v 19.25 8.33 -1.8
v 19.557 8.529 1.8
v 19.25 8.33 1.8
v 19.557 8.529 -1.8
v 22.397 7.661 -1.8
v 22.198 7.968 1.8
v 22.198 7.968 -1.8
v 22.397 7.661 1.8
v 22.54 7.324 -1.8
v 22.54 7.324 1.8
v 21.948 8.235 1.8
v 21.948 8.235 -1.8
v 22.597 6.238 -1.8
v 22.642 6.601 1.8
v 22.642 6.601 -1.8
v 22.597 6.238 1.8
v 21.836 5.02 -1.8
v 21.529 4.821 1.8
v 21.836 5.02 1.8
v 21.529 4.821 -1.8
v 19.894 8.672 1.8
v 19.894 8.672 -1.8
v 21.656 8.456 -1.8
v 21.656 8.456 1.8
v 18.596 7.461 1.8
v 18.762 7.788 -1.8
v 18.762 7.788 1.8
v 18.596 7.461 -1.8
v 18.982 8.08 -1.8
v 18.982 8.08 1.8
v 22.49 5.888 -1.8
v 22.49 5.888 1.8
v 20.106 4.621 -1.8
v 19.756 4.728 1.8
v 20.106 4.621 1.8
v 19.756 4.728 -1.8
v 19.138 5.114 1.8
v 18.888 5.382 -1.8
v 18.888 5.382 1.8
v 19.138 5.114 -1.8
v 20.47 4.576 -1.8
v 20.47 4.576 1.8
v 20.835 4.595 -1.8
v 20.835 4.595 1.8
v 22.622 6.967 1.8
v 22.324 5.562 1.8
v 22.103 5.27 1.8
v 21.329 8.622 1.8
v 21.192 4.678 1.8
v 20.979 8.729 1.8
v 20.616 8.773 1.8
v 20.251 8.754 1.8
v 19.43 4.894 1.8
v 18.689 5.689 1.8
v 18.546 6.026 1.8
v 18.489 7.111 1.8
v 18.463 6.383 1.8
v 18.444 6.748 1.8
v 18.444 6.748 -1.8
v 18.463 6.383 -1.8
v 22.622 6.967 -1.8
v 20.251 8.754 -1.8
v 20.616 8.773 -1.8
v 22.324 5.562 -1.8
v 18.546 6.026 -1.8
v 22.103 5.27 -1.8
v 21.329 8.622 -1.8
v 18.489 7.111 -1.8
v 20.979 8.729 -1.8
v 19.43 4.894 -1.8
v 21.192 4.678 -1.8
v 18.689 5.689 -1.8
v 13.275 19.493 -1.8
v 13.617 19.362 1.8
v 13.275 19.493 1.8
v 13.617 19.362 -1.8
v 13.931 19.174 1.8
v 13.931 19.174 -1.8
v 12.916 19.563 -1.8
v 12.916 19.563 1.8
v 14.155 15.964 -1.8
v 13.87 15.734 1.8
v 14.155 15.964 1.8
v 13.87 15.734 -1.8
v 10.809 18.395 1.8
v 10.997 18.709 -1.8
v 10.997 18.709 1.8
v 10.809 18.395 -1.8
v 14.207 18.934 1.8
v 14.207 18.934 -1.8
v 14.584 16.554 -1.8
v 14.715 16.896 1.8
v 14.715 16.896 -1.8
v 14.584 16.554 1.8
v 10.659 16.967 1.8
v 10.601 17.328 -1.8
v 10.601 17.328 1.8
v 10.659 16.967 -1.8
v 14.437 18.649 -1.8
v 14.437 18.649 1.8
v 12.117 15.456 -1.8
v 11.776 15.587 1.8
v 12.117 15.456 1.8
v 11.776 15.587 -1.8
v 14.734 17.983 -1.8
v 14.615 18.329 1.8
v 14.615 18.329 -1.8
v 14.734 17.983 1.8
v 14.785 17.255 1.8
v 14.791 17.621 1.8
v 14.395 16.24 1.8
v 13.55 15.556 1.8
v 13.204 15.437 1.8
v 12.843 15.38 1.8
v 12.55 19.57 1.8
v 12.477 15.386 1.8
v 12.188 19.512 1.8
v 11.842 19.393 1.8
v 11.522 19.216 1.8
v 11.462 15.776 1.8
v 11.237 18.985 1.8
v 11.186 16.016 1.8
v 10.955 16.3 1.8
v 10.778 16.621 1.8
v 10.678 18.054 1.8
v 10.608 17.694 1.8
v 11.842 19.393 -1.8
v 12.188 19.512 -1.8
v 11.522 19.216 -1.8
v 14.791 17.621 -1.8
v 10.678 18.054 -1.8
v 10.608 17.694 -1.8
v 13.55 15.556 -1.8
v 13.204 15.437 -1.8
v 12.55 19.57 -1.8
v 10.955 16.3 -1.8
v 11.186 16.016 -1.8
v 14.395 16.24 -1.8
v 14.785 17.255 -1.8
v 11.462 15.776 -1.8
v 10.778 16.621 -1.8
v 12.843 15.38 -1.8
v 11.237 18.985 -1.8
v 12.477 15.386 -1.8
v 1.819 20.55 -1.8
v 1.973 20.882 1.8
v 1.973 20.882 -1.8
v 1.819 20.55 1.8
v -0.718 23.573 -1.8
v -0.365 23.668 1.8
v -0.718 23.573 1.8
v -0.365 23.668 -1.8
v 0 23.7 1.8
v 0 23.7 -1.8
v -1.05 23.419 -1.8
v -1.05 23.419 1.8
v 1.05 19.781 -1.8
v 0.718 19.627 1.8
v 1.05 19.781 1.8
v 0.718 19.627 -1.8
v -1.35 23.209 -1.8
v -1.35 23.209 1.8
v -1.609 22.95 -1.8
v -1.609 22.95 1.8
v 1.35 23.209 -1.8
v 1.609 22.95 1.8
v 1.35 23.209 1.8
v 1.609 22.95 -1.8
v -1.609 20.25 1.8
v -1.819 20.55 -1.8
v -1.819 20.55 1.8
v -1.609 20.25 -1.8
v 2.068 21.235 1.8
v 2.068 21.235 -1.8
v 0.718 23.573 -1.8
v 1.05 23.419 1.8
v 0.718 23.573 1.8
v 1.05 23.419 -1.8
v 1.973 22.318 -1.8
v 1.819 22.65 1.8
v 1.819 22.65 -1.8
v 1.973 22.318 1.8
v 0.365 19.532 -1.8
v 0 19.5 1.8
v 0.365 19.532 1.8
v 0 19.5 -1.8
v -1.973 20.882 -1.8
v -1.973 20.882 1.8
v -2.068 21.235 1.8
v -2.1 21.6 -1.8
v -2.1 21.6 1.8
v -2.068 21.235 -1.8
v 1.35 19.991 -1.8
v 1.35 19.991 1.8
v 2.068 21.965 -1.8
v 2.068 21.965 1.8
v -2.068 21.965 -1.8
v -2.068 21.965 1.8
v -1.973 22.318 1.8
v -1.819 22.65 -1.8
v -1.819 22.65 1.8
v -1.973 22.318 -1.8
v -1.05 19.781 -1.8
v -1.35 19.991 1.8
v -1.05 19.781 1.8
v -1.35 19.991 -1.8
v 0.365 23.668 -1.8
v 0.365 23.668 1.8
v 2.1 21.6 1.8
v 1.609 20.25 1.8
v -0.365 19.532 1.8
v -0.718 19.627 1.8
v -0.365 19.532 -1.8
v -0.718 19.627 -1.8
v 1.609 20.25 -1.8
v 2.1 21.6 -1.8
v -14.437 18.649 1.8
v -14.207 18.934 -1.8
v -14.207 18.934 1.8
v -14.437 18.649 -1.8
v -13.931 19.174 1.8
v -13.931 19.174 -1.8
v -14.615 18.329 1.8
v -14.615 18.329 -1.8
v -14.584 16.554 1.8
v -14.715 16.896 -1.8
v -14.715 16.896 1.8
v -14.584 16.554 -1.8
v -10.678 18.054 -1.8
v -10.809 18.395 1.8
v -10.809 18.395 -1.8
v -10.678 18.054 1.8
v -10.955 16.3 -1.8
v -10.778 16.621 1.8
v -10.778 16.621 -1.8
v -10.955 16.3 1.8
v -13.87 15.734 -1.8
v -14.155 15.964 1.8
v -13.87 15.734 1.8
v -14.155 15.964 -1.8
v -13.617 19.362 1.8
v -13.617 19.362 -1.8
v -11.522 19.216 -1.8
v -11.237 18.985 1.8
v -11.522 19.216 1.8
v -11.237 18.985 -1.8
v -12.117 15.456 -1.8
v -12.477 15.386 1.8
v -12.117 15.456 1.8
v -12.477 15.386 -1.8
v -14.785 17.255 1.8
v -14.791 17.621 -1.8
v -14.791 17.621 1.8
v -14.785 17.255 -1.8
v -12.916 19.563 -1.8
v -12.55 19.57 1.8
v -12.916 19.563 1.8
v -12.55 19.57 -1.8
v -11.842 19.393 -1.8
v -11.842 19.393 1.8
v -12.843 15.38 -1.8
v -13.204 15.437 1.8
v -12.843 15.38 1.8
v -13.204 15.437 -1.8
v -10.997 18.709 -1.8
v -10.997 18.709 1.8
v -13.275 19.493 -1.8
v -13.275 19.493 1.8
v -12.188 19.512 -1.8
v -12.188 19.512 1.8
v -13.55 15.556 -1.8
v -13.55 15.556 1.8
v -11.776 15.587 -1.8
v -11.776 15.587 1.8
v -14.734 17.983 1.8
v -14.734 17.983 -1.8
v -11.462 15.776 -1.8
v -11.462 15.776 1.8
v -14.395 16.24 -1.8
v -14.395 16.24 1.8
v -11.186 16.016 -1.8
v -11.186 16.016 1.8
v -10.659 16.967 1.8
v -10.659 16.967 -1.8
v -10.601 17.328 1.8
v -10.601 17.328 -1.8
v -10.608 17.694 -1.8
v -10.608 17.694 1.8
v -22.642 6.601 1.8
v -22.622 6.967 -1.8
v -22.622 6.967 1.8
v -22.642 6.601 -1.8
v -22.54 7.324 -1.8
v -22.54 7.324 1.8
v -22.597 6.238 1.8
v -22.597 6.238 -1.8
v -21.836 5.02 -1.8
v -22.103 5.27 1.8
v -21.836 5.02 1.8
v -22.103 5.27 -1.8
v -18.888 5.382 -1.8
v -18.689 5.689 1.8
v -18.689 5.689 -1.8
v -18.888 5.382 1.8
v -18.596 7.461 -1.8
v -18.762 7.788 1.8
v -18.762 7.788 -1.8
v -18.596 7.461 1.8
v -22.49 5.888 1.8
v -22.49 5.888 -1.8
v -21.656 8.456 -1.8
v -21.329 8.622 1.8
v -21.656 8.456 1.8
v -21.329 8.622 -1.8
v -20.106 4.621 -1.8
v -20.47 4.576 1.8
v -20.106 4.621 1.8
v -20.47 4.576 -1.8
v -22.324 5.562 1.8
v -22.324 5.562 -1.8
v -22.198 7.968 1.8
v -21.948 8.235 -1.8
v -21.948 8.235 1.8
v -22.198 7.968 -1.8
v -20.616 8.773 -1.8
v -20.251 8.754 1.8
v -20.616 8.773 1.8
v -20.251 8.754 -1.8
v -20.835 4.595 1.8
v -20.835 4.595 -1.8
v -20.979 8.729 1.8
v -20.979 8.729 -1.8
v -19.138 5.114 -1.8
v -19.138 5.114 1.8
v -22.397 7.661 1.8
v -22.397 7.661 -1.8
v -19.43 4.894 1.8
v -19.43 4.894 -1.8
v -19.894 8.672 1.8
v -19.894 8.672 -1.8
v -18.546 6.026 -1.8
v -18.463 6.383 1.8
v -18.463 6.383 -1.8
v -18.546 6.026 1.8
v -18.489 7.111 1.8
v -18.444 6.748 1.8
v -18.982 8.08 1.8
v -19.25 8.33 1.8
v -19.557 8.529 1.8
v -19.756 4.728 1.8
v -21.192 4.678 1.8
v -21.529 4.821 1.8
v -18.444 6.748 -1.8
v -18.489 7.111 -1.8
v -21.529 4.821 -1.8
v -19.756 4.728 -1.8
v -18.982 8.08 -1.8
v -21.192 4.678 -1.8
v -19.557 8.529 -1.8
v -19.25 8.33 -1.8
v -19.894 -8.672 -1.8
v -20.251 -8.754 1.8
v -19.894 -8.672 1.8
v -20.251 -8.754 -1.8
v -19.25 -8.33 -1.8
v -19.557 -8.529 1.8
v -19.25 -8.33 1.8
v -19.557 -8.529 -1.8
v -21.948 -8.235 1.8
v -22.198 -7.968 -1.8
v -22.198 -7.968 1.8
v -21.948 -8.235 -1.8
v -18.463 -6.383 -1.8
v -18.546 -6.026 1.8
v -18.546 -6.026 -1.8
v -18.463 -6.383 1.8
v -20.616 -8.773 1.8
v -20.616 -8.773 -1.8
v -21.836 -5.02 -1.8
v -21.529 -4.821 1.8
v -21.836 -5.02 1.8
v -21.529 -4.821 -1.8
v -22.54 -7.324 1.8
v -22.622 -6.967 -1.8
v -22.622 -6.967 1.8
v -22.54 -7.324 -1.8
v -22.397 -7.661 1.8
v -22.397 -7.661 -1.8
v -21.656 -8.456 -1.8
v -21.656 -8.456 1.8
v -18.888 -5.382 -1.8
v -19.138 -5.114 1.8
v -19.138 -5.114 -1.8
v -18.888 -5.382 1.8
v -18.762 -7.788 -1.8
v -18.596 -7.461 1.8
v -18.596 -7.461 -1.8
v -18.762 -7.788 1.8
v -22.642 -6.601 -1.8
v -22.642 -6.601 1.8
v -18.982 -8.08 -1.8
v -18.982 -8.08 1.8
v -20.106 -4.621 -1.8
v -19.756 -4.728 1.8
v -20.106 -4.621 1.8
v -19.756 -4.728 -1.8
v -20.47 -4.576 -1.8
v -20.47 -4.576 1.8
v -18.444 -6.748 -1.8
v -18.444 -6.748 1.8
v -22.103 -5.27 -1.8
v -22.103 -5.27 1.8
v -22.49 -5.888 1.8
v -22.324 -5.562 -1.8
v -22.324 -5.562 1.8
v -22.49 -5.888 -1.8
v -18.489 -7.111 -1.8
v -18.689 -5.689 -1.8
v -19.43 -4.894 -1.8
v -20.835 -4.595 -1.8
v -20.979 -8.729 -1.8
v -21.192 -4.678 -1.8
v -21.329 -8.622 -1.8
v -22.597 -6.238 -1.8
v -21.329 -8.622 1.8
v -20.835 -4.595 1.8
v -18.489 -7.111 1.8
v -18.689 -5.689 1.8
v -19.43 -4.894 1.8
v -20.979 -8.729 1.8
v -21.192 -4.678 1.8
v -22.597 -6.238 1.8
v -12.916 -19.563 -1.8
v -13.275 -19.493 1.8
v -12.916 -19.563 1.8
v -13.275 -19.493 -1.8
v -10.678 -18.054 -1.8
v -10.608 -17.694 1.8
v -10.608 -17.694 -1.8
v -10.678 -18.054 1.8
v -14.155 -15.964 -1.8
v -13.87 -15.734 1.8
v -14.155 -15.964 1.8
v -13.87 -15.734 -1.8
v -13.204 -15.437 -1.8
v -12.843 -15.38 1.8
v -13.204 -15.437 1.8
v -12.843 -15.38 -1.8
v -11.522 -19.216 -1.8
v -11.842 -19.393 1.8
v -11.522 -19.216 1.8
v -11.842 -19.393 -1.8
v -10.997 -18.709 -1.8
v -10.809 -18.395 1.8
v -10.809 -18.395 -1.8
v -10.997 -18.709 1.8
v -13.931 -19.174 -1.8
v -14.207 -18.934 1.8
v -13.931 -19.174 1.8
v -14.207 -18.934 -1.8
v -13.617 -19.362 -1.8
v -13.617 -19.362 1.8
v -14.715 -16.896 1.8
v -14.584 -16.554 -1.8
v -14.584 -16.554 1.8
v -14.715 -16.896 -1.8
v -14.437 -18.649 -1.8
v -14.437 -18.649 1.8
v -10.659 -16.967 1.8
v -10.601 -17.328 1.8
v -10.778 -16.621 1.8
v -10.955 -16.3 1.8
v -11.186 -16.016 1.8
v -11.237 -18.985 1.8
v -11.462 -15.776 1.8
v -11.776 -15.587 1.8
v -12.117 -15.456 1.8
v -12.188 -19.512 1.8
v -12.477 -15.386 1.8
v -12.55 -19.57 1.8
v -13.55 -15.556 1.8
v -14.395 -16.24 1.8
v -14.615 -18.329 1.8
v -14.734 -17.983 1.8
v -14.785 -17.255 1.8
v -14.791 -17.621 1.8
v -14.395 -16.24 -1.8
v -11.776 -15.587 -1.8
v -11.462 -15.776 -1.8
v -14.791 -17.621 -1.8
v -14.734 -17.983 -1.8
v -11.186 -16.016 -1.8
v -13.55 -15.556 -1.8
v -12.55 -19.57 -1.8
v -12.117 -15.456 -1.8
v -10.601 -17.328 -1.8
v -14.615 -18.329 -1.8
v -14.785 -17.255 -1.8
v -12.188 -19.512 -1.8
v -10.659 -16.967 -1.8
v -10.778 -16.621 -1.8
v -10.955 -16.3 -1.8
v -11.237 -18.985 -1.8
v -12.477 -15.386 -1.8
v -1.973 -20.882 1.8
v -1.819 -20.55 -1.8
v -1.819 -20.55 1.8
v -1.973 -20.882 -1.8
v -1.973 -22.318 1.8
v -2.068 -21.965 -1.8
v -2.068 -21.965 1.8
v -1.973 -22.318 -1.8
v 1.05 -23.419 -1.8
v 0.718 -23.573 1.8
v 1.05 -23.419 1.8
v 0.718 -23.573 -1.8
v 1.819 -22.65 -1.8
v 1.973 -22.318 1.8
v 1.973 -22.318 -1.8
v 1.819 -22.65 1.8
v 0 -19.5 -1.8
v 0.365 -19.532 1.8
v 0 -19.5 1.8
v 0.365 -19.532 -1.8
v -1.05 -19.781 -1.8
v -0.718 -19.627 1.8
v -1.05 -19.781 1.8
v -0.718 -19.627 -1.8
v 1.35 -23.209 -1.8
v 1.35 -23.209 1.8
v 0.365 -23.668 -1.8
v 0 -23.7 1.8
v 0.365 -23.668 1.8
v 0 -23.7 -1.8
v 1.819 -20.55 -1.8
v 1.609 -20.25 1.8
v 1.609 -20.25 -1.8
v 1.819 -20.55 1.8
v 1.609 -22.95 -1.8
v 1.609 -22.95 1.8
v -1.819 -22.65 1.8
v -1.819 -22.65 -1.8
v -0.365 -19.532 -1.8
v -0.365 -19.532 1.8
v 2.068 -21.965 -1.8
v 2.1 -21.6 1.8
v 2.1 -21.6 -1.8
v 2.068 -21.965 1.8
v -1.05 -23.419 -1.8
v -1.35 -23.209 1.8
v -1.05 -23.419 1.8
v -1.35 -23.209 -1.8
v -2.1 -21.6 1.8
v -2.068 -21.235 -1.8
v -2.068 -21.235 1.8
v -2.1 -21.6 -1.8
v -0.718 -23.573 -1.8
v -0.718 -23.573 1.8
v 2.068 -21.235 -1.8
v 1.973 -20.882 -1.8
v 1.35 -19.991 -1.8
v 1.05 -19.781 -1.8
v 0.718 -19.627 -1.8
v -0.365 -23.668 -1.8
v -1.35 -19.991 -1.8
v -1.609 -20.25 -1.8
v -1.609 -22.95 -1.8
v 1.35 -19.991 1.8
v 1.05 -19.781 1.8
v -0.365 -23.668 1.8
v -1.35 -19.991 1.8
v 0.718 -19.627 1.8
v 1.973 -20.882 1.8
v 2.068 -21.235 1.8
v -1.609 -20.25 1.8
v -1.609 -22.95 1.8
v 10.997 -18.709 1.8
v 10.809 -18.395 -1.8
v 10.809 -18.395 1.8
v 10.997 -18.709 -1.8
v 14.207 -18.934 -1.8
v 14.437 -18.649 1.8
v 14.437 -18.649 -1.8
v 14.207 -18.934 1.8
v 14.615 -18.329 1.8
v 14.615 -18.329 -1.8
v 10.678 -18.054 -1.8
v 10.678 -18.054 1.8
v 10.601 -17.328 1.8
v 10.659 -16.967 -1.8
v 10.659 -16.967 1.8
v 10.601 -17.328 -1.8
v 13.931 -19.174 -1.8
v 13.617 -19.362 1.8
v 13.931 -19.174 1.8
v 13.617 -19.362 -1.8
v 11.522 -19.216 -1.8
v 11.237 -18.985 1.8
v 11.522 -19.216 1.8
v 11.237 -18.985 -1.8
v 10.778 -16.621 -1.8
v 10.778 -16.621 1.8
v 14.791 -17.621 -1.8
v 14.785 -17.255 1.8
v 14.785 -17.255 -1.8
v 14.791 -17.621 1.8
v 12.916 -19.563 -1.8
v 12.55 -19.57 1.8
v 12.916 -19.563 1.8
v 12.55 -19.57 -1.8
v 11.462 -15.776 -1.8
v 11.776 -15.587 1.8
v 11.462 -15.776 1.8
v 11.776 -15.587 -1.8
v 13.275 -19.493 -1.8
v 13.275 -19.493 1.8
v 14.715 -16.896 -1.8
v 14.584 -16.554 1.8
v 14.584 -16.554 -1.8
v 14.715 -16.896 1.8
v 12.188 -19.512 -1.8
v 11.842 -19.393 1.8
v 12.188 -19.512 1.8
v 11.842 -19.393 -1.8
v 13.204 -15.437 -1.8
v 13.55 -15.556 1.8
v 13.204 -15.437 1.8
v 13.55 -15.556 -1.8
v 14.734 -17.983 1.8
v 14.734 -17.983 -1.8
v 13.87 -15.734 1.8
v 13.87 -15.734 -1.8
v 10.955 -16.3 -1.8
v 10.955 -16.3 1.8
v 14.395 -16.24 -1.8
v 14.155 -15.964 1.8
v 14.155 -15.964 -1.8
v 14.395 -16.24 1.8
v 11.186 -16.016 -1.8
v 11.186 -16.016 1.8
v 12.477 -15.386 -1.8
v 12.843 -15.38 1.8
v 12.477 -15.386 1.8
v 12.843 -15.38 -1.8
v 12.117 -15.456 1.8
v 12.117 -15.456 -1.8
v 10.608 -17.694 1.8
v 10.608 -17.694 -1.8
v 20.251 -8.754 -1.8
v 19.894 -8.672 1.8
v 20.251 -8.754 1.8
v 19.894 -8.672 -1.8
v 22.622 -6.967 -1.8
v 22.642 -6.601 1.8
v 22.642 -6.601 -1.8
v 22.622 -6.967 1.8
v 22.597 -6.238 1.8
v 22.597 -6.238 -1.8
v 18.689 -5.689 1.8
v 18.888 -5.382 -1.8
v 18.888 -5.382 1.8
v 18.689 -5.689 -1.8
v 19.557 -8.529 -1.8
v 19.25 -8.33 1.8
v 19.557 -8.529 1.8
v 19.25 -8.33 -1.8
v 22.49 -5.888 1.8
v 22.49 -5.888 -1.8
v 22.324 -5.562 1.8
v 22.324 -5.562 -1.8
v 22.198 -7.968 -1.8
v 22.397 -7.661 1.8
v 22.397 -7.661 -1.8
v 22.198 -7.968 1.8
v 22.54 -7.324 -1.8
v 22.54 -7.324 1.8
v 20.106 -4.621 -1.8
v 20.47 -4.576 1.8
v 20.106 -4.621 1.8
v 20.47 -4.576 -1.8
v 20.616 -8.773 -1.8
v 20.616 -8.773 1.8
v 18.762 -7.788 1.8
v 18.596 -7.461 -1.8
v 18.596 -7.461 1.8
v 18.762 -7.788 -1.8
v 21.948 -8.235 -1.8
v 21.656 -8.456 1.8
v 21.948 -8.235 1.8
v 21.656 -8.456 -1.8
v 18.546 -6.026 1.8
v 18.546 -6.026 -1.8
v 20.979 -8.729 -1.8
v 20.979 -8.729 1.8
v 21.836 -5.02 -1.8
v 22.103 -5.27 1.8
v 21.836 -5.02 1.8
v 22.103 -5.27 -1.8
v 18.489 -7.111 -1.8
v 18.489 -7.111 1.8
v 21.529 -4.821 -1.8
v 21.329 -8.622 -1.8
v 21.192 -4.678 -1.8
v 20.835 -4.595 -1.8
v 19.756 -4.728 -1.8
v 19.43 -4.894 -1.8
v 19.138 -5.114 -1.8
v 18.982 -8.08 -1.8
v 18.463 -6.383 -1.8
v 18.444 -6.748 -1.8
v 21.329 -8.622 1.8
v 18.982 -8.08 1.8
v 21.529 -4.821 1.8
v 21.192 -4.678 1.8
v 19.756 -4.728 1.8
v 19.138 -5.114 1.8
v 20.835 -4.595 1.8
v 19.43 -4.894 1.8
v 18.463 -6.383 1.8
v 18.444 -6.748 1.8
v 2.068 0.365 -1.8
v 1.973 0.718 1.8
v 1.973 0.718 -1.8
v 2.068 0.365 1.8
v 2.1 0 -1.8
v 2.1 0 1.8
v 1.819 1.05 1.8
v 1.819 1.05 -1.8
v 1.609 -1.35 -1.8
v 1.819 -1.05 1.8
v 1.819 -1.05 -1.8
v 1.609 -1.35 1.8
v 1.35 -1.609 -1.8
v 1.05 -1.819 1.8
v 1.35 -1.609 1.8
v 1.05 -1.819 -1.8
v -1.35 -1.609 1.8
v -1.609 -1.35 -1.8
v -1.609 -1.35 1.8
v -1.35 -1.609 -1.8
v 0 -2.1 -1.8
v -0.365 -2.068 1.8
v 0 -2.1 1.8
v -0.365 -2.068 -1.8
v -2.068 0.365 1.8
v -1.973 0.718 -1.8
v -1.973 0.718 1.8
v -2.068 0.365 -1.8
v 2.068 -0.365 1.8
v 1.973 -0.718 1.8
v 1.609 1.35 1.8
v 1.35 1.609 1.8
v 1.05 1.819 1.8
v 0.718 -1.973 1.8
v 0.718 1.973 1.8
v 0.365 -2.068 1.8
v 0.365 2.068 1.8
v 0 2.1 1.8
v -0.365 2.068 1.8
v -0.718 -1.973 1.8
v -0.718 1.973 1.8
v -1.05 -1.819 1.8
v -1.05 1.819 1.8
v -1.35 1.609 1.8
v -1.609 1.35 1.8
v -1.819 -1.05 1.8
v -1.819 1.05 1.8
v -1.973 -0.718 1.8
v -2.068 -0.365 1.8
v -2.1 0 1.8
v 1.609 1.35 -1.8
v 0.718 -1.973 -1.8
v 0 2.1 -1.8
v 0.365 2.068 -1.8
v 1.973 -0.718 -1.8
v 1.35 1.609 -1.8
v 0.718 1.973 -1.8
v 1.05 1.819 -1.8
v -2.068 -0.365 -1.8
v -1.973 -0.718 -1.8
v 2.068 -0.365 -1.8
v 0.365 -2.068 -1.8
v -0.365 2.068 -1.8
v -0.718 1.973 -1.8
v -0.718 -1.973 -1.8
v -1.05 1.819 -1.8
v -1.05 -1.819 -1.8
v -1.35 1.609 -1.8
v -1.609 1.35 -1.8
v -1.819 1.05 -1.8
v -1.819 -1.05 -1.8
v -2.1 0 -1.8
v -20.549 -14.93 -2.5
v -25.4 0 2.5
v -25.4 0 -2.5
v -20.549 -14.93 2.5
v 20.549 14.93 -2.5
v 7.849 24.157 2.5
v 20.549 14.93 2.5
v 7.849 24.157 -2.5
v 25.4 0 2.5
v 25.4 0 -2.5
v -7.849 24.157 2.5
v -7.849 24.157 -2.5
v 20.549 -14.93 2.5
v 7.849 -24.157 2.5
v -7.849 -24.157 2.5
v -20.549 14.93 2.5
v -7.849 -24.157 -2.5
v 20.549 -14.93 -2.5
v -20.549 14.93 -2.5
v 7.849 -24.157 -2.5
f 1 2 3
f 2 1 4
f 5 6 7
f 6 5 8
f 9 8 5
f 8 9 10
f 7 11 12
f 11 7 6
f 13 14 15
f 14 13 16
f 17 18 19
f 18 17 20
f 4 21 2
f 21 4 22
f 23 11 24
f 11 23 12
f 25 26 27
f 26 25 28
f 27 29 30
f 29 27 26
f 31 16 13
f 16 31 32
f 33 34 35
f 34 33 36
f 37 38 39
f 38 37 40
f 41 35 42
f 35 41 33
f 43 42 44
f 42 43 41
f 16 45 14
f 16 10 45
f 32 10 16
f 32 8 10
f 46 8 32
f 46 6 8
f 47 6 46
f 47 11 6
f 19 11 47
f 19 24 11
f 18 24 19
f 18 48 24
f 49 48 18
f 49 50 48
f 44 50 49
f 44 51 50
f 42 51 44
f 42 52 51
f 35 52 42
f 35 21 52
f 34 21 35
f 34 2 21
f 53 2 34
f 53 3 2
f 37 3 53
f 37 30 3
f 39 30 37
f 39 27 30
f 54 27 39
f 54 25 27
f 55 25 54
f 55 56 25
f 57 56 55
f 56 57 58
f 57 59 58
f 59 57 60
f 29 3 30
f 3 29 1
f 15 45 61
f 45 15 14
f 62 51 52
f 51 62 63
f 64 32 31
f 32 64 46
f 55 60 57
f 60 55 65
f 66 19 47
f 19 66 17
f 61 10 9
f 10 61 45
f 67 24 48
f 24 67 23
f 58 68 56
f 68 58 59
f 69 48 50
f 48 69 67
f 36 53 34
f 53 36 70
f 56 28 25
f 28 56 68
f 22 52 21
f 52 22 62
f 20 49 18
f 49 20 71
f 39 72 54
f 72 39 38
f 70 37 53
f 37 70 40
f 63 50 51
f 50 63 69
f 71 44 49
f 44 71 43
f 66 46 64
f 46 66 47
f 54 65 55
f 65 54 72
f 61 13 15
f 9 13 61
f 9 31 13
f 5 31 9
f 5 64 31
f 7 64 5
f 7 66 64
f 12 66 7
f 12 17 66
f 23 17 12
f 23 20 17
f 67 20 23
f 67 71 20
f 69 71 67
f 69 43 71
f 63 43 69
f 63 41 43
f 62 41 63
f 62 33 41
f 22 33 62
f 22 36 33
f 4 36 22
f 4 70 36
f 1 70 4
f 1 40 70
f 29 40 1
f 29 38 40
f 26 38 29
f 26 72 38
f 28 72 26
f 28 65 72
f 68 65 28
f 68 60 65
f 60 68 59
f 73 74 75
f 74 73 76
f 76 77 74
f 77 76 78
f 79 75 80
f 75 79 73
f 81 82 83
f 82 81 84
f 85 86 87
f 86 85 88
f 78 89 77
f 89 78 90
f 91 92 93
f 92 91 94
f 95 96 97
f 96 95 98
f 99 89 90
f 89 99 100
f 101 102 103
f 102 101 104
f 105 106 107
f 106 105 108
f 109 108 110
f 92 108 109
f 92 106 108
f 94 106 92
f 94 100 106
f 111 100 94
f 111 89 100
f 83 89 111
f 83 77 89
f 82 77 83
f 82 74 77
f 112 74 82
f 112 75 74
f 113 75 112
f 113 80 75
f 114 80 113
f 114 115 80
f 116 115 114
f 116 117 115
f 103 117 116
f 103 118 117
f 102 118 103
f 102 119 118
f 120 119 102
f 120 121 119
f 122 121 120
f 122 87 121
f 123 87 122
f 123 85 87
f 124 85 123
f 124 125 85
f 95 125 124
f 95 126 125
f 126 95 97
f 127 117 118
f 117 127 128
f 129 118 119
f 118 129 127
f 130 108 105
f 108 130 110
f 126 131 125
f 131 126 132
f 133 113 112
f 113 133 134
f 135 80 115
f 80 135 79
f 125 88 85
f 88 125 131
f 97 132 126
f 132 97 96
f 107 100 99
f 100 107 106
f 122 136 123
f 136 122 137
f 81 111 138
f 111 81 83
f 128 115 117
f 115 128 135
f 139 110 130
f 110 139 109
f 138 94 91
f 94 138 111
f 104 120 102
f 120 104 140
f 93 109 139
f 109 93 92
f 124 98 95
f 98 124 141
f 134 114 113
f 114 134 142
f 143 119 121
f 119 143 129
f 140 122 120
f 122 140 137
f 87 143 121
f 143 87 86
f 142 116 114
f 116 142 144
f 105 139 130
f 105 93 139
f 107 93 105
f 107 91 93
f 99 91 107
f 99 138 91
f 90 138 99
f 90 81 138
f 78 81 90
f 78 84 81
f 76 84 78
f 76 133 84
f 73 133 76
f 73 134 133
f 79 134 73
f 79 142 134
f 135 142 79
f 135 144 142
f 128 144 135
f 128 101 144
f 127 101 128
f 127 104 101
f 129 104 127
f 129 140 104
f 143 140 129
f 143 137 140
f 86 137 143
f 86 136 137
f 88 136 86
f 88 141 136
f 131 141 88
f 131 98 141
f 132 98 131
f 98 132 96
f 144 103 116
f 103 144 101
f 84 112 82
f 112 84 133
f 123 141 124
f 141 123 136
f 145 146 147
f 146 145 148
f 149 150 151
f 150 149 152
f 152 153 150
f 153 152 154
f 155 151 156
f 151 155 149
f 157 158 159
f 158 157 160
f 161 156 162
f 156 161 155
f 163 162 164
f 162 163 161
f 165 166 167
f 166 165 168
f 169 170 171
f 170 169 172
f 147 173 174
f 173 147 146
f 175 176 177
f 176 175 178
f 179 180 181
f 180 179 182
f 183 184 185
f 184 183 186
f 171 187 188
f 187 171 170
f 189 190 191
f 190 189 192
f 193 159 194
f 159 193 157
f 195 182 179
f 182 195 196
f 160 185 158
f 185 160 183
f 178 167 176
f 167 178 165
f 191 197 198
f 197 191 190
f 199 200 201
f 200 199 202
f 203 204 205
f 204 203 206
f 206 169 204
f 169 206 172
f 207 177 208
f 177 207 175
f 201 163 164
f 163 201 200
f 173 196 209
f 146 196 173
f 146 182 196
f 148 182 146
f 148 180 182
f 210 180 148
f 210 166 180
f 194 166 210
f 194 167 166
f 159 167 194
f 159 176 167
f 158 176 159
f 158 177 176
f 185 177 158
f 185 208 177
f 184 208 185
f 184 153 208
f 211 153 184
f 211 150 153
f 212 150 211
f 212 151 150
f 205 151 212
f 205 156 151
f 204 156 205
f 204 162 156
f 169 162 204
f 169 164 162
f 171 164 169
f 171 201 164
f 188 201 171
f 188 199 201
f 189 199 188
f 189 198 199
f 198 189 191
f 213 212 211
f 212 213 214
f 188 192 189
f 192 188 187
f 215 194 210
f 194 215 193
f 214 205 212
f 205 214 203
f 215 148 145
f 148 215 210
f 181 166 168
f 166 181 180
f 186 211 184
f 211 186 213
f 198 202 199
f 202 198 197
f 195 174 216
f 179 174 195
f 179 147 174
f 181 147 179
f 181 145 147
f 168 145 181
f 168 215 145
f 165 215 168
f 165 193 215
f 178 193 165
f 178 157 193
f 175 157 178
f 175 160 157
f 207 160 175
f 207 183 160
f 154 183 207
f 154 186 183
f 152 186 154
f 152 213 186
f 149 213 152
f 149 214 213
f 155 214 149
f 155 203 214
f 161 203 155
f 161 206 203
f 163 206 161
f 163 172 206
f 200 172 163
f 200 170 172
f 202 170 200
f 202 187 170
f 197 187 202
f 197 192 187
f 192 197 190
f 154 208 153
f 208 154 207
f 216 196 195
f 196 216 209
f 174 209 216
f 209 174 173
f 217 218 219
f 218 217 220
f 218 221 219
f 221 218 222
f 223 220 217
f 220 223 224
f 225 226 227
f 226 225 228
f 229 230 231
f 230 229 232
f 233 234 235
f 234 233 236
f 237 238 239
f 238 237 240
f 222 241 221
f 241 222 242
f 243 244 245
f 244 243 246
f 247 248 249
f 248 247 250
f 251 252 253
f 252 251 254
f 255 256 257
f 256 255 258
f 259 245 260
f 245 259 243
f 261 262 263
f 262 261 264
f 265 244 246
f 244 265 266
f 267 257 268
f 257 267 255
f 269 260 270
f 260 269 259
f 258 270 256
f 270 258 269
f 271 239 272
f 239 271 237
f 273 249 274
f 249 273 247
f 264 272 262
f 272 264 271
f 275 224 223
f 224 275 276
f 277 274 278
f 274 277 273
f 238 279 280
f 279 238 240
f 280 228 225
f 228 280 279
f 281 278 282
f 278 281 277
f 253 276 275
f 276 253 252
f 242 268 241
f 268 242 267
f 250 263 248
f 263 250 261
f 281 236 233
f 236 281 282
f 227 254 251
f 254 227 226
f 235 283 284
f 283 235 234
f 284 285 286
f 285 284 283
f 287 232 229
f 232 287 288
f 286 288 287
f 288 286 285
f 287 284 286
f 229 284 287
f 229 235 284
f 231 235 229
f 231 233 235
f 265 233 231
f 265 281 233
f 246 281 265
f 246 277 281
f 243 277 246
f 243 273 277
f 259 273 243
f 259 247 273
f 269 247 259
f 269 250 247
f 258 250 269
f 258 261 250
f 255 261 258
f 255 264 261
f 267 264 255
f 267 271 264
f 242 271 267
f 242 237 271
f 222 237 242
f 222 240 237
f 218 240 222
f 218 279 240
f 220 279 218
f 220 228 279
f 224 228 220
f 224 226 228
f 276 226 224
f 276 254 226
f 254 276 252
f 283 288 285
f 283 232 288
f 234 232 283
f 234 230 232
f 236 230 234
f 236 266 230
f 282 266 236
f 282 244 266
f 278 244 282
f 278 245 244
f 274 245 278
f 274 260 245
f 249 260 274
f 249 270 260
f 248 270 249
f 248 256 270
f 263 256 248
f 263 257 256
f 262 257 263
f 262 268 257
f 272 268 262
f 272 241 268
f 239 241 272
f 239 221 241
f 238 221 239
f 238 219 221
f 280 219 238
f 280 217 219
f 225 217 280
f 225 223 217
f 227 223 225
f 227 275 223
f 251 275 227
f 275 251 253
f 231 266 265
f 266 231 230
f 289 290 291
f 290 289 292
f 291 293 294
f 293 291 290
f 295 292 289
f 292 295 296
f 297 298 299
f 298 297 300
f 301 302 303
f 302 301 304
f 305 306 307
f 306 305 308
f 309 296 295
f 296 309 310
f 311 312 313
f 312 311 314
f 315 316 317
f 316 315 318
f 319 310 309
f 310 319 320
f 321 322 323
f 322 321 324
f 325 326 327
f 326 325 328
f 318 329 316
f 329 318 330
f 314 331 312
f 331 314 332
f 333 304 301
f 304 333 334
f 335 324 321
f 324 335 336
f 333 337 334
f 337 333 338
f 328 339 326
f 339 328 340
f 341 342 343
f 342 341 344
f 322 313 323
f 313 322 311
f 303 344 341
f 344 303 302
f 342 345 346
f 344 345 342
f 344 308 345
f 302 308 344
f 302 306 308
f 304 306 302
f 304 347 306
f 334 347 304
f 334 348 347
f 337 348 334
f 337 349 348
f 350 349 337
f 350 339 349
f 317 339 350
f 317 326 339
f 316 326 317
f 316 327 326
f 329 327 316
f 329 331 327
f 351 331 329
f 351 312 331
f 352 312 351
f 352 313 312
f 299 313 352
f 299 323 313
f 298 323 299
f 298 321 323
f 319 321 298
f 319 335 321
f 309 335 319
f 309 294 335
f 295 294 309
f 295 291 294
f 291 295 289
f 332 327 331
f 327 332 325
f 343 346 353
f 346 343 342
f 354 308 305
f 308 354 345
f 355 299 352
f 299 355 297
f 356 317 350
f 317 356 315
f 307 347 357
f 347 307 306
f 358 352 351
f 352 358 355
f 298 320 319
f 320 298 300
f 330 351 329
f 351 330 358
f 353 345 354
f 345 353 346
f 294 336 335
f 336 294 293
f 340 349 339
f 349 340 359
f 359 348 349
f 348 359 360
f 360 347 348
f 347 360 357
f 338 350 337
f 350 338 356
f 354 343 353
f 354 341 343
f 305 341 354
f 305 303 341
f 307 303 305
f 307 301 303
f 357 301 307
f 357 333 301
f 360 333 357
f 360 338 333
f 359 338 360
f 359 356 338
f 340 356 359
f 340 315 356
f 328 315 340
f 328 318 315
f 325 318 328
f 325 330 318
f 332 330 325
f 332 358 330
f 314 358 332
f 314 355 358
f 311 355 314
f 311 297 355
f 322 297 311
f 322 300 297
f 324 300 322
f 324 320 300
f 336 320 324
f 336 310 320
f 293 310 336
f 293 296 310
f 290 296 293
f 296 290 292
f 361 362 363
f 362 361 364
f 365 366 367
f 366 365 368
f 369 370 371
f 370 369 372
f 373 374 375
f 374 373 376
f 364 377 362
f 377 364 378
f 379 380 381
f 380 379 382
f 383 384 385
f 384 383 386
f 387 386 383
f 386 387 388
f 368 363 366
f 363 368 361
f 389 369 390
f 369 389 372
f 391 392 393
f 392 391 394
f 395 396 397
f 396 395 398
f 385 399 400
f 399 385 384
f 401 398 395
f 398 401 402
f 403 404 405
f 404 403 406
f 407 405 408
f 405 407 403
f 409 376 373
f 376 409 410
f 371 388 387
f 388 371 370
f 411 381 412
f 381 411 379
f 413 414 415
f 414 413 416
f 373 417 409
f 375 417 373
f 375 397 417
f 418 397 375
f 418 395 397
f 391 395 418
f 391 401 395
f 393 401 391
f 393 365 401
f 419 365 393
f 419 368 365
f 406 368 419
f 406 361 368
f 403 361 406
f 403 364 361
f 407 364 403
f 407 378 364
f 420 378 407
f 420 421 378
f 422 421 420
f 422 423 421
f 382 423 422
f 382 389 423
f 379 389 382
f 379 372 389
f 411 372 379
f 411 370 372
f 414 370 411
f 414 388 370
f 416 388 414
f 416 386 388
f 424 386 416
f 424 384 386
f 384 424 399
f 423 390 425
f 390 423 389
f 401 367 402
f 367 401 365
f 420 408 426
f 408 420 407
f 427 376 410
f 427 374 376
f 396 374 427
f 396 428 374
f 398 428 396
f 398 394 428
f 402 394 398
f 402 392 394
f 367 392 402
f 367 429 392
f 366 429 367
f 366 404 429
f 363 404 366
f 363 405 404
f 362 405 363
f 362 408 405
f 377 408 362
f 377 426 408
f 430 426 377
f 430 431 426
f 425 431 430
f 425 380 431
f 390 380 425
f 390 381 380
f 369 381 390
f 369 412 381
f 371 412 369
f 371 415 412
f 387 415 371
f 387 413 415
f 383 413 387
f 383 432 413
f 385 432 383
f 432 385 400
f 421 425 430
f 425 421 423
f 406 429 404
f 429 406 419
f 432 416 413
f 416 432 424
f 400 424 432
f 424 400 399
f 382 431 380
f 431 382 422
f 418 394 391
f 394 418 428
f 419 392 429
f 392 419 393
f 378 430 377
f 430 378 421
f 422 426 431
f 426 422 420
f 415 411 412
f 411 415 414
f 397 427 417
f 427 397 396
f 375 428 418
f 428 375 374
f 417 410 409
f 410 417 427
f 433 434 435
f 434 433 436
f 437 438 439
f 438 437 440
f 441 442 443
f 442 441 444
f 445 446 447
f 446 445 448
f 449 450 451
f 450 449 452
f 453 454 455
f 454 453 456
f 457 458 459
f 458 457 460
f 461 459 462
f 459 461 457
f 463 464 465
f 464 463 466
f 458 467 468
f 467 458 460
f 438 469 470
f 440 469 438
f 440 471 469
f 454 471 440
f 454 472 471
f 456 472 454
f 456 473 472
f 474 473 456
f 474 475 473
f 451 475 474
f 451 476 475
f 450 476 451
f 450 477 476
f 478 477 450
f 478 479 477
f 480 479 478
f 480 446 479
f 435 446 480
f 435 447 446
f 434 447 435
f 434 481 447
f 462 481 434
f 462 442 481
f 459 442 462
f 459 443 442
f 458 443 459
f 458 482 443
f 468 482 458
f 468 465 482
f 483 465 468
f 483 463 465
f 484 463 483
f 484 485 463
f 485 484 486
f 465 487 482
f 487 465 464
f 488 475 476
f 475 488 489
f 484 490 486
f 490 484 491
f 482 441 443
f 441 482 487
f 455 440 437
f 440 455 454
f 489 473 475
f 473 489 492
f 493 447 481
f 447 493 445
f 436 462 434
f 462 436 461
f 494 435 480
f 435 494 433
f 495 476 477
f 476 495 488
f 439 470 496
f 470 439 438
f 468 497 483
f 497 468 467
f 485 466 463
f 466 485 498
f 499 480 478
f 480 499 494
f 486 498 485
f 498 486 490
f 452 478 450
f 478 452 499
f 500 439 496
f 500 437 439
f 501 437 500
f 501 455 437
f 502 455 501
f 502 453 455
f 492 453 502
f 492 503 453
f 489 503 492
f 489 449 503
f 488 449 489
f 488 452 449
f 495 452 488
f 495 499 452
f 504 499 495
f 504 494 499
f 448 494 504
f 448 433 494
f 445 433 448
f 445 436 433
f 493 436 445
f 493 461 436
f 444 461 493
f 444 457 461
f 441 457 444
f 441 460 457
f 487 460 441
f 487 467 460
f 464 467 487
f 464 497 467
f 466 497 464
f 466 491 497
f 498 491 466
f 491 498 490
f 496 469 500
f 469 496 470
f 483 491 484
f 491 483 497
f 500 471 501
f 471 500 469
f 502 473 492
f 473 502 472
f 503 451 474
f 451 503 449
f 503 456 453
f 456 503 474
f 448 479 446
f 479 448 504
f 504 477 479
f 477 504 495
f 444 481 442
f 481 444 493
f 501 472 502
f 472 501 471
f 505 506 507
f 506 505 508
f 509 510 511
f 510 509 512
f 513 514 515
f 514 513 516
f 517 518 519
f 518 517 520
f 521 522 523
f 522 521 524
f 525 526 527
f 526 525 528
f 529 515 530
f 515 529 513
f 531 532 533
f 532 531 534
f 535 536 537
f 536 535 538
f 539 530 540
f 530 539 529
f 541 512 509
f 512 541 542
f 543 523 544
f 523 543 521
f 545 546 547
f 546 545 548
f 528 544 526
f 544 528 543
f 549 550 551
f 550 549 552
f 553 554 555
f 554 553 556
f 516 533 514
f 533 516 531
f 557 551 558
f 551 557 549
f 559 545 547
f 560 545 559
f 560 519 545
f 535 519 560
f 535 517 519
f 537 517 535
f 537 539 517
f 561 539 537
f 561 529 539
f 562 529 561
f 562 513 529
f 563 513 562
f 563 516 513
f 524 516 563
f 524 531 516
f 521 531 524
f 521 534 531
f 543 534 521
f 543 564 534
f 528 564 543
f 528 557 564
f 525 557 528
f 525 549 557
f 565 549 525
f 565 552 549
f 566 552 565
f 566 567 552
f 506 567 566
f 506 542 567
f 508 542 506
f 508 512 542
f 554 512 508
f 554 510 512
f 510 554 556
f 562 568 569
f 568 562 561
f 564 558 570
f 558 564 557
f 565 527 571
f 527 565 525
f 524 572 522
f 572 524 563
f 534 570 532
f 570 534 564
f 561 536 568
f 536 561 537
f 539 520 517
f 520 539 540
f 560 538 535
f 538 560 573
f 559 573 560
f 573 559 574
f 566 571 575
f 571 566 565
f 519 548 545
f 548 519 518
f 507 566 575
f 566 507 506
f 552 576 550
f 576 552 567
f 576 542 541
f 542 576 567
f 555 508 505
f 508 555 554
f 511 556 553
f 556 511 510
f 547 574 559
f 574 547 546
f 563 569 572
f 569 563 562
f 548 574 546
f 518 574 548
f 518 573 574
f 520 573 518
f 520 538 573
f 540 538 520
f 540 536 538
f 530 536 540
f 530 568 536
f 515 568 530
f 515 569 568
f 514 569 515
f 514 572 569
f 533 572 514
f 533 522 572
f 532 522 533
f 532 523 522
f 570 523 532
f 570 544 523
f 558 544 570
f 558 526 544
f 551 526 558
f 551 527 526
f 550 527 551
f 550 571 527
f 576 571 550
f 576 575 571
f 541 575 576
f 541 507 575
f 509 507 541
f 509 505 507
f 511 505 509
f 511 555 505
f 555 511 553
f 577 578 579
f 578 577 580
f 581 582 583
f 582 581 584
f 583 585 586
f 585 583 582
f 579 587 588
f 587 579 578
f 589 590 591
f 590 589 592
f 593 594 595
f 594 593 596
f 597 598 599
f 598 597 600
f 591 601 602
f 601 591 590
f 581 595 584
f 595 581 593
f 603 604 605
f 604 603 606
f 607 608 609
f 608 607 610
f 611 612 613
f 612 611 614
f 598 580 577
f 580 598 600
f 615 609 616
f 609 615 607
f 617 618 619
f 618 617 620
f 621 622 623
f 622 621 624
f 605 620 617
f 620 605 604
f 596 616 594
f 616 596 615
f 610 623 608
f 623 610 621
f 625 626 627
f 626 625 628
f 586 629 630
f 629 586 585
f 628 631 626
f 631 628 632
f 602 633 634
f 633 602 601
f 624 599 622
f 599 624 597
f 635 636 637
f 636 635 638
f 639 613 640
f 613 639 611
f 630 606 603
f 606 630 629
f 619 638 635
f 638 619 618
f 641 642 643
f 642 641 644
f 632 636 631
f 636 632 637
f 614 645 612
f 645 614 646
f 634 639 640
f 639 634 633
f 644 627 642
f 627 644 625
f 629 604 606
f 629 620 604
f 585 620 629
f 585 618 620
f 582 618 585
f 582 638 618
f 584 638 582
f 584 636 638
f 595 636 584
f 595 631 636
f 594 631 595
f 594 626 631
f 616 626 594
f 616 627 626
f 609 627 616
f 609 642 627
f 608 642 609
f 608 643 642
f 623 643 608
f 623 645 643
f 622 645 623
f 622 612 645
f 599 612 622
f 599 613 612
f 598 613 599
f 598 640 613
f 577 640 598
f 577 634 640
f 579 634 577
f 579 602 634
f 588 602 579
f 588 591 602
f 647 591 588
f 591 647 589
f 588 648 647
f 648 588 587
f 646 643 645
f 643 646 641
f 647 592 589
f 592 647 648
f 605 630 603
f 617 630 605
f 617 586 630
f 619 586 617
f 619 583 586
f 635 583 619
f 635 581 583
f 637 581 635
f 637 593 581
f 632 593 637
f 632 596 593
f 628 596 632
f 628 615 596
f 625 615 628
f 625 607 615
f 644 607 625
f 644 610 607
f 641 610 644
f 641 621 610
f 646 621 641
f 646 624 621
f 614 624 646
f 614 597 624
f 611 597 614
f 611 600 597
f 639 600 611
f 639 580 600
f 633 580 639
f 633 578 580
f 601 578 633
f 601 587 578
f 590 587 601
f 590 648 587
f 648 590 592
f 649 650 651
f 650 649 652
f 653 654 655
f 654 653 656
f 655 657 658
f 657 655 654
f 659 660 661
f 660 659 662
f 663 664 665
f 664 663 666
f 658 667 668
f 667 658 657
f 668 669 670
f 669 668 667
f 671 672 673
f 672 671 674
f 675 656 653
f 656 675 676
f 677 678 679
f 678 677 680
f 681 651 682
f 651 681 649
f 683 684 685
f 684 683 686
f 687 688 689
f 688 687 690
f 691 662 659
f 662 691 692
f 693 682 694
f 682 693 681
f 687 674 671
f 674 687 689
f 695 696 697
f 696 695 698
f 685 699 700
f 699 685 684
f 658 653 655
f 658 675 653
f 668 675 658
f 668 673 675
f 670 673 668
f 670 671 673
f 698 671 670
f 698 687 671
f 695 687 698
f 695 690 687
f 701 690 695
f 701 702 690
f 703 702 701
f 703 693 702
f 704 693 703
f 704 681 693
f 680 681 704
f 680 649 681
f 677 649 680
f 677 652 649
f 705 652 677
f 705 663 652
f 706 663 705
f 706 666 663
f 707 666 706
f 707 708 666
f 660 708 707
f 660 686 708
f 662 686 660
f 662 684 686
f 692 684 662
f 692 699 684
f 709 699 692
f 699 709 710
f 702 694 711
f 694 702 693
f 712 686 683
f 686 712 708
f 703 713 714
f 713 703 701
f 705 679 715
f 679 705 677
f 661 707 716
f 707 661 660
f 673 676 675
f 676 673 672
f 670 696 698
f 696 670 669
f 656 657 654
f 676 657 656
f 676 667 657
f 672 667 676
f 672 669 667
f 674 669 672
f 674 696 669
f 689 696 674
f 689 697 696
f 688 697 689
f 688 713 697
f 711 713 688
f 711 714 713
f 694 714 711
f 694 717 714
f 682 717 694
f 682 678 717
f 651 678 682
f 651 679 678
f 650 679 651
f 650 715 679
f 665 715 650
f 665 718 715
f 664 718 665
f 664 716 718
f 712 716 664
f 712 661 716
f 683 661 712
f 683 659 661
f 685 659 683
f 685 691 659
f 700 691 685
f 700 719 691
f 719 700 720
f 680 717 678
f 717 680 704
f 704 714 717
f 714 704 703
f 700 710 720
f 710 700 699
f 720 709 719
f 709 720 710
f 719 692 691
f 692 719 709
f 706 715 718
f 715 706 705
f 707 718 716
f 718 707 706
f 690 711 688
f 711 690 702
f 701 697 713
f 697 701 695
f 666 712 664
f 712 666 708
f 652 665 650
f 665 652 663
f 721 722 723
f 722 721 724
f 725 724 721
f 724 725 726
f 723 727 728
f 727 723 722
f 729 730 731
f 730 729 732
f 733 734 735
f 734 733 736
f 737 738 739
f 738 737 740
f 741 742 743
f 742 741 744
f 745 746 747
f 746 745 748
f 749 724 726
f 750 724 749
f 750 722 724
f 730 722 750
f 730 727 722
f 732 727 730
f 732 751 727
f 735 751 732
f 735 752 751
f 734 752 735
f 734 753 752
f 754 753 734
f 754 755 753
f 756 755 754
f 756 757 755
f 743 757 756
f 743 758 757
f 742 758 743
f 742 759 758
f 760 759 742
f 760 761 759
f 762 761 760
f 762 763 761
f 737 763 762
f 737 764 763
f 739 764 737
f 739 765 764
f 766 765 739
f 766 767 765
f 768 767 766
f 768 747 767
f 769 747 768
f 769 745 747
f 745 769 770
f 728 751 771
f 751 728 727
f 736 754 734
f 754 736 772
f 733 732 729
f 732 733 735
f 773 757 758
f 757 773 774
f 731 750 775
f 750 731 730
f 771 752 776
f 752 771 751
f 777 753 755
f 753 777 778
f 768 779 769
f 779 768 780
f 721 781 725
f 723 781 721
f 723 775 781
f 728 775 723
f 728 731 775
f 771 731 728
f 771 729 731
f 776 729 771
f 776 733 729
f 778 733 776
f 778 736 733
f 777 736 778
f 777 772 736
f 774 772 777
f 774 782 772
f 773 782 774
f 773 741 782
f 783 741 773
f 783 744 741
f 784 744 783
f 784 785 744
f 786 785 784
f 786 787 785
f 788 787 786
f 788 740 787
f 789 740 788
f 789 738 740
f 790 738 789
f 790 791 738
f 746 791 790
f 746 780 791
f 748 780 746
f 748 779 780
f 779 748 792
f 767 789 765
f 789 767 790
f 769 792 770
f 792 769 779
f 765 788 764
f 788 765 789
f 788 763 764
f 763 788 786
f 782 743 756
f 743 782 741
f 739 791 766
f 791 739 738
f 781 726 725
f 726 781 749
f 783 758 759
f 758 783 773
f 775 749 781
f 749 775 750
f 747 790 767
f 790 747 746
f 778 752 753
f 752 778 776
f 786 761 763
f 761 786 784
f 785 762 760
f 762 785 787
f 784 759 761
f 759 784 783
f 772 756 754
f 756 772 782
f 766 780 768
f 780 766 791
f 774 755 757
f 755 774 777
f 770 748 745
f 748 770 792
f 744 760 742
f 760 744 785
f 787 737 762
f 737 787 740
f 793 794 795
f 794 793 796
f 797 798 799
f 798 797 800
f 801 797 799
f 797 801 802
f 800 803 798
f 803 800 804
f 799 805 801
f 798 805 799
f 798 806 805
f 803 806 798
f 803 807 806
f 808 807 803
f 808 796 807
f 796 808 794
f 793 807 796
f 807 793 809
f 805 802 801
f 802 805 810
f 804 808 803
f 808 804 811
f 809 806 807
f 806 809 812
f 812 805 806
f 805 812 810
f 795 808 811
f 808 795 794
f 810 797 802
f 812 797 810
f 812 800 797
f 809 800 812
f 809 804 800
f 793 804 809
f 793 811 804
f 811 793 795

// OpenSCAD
// hundred.scad

inch = 25.4;
h = 5; // height unit, 5mm
o2 = 0.2;
br = 1.7; // ball radius

module balcyl(deeper=false) {

  hf = 2;
  h = br * hf + o2;

  cylinder(r=br + 2 * o2, h=h, center=true, $fn=36);
}

difference() {
  cylinder(h=h, d=2 * inch, center=true, $fn=10);
  union() {
    balcyl();
    for(a = [ 360/20 : 360/10 : 360 ]) {
      echo(a);
      rotate([ 0, 0, a ]) translate([ inch - br * 2 - 2 * o2, 0, 0 ]) balcyl();
    }
  }
}
